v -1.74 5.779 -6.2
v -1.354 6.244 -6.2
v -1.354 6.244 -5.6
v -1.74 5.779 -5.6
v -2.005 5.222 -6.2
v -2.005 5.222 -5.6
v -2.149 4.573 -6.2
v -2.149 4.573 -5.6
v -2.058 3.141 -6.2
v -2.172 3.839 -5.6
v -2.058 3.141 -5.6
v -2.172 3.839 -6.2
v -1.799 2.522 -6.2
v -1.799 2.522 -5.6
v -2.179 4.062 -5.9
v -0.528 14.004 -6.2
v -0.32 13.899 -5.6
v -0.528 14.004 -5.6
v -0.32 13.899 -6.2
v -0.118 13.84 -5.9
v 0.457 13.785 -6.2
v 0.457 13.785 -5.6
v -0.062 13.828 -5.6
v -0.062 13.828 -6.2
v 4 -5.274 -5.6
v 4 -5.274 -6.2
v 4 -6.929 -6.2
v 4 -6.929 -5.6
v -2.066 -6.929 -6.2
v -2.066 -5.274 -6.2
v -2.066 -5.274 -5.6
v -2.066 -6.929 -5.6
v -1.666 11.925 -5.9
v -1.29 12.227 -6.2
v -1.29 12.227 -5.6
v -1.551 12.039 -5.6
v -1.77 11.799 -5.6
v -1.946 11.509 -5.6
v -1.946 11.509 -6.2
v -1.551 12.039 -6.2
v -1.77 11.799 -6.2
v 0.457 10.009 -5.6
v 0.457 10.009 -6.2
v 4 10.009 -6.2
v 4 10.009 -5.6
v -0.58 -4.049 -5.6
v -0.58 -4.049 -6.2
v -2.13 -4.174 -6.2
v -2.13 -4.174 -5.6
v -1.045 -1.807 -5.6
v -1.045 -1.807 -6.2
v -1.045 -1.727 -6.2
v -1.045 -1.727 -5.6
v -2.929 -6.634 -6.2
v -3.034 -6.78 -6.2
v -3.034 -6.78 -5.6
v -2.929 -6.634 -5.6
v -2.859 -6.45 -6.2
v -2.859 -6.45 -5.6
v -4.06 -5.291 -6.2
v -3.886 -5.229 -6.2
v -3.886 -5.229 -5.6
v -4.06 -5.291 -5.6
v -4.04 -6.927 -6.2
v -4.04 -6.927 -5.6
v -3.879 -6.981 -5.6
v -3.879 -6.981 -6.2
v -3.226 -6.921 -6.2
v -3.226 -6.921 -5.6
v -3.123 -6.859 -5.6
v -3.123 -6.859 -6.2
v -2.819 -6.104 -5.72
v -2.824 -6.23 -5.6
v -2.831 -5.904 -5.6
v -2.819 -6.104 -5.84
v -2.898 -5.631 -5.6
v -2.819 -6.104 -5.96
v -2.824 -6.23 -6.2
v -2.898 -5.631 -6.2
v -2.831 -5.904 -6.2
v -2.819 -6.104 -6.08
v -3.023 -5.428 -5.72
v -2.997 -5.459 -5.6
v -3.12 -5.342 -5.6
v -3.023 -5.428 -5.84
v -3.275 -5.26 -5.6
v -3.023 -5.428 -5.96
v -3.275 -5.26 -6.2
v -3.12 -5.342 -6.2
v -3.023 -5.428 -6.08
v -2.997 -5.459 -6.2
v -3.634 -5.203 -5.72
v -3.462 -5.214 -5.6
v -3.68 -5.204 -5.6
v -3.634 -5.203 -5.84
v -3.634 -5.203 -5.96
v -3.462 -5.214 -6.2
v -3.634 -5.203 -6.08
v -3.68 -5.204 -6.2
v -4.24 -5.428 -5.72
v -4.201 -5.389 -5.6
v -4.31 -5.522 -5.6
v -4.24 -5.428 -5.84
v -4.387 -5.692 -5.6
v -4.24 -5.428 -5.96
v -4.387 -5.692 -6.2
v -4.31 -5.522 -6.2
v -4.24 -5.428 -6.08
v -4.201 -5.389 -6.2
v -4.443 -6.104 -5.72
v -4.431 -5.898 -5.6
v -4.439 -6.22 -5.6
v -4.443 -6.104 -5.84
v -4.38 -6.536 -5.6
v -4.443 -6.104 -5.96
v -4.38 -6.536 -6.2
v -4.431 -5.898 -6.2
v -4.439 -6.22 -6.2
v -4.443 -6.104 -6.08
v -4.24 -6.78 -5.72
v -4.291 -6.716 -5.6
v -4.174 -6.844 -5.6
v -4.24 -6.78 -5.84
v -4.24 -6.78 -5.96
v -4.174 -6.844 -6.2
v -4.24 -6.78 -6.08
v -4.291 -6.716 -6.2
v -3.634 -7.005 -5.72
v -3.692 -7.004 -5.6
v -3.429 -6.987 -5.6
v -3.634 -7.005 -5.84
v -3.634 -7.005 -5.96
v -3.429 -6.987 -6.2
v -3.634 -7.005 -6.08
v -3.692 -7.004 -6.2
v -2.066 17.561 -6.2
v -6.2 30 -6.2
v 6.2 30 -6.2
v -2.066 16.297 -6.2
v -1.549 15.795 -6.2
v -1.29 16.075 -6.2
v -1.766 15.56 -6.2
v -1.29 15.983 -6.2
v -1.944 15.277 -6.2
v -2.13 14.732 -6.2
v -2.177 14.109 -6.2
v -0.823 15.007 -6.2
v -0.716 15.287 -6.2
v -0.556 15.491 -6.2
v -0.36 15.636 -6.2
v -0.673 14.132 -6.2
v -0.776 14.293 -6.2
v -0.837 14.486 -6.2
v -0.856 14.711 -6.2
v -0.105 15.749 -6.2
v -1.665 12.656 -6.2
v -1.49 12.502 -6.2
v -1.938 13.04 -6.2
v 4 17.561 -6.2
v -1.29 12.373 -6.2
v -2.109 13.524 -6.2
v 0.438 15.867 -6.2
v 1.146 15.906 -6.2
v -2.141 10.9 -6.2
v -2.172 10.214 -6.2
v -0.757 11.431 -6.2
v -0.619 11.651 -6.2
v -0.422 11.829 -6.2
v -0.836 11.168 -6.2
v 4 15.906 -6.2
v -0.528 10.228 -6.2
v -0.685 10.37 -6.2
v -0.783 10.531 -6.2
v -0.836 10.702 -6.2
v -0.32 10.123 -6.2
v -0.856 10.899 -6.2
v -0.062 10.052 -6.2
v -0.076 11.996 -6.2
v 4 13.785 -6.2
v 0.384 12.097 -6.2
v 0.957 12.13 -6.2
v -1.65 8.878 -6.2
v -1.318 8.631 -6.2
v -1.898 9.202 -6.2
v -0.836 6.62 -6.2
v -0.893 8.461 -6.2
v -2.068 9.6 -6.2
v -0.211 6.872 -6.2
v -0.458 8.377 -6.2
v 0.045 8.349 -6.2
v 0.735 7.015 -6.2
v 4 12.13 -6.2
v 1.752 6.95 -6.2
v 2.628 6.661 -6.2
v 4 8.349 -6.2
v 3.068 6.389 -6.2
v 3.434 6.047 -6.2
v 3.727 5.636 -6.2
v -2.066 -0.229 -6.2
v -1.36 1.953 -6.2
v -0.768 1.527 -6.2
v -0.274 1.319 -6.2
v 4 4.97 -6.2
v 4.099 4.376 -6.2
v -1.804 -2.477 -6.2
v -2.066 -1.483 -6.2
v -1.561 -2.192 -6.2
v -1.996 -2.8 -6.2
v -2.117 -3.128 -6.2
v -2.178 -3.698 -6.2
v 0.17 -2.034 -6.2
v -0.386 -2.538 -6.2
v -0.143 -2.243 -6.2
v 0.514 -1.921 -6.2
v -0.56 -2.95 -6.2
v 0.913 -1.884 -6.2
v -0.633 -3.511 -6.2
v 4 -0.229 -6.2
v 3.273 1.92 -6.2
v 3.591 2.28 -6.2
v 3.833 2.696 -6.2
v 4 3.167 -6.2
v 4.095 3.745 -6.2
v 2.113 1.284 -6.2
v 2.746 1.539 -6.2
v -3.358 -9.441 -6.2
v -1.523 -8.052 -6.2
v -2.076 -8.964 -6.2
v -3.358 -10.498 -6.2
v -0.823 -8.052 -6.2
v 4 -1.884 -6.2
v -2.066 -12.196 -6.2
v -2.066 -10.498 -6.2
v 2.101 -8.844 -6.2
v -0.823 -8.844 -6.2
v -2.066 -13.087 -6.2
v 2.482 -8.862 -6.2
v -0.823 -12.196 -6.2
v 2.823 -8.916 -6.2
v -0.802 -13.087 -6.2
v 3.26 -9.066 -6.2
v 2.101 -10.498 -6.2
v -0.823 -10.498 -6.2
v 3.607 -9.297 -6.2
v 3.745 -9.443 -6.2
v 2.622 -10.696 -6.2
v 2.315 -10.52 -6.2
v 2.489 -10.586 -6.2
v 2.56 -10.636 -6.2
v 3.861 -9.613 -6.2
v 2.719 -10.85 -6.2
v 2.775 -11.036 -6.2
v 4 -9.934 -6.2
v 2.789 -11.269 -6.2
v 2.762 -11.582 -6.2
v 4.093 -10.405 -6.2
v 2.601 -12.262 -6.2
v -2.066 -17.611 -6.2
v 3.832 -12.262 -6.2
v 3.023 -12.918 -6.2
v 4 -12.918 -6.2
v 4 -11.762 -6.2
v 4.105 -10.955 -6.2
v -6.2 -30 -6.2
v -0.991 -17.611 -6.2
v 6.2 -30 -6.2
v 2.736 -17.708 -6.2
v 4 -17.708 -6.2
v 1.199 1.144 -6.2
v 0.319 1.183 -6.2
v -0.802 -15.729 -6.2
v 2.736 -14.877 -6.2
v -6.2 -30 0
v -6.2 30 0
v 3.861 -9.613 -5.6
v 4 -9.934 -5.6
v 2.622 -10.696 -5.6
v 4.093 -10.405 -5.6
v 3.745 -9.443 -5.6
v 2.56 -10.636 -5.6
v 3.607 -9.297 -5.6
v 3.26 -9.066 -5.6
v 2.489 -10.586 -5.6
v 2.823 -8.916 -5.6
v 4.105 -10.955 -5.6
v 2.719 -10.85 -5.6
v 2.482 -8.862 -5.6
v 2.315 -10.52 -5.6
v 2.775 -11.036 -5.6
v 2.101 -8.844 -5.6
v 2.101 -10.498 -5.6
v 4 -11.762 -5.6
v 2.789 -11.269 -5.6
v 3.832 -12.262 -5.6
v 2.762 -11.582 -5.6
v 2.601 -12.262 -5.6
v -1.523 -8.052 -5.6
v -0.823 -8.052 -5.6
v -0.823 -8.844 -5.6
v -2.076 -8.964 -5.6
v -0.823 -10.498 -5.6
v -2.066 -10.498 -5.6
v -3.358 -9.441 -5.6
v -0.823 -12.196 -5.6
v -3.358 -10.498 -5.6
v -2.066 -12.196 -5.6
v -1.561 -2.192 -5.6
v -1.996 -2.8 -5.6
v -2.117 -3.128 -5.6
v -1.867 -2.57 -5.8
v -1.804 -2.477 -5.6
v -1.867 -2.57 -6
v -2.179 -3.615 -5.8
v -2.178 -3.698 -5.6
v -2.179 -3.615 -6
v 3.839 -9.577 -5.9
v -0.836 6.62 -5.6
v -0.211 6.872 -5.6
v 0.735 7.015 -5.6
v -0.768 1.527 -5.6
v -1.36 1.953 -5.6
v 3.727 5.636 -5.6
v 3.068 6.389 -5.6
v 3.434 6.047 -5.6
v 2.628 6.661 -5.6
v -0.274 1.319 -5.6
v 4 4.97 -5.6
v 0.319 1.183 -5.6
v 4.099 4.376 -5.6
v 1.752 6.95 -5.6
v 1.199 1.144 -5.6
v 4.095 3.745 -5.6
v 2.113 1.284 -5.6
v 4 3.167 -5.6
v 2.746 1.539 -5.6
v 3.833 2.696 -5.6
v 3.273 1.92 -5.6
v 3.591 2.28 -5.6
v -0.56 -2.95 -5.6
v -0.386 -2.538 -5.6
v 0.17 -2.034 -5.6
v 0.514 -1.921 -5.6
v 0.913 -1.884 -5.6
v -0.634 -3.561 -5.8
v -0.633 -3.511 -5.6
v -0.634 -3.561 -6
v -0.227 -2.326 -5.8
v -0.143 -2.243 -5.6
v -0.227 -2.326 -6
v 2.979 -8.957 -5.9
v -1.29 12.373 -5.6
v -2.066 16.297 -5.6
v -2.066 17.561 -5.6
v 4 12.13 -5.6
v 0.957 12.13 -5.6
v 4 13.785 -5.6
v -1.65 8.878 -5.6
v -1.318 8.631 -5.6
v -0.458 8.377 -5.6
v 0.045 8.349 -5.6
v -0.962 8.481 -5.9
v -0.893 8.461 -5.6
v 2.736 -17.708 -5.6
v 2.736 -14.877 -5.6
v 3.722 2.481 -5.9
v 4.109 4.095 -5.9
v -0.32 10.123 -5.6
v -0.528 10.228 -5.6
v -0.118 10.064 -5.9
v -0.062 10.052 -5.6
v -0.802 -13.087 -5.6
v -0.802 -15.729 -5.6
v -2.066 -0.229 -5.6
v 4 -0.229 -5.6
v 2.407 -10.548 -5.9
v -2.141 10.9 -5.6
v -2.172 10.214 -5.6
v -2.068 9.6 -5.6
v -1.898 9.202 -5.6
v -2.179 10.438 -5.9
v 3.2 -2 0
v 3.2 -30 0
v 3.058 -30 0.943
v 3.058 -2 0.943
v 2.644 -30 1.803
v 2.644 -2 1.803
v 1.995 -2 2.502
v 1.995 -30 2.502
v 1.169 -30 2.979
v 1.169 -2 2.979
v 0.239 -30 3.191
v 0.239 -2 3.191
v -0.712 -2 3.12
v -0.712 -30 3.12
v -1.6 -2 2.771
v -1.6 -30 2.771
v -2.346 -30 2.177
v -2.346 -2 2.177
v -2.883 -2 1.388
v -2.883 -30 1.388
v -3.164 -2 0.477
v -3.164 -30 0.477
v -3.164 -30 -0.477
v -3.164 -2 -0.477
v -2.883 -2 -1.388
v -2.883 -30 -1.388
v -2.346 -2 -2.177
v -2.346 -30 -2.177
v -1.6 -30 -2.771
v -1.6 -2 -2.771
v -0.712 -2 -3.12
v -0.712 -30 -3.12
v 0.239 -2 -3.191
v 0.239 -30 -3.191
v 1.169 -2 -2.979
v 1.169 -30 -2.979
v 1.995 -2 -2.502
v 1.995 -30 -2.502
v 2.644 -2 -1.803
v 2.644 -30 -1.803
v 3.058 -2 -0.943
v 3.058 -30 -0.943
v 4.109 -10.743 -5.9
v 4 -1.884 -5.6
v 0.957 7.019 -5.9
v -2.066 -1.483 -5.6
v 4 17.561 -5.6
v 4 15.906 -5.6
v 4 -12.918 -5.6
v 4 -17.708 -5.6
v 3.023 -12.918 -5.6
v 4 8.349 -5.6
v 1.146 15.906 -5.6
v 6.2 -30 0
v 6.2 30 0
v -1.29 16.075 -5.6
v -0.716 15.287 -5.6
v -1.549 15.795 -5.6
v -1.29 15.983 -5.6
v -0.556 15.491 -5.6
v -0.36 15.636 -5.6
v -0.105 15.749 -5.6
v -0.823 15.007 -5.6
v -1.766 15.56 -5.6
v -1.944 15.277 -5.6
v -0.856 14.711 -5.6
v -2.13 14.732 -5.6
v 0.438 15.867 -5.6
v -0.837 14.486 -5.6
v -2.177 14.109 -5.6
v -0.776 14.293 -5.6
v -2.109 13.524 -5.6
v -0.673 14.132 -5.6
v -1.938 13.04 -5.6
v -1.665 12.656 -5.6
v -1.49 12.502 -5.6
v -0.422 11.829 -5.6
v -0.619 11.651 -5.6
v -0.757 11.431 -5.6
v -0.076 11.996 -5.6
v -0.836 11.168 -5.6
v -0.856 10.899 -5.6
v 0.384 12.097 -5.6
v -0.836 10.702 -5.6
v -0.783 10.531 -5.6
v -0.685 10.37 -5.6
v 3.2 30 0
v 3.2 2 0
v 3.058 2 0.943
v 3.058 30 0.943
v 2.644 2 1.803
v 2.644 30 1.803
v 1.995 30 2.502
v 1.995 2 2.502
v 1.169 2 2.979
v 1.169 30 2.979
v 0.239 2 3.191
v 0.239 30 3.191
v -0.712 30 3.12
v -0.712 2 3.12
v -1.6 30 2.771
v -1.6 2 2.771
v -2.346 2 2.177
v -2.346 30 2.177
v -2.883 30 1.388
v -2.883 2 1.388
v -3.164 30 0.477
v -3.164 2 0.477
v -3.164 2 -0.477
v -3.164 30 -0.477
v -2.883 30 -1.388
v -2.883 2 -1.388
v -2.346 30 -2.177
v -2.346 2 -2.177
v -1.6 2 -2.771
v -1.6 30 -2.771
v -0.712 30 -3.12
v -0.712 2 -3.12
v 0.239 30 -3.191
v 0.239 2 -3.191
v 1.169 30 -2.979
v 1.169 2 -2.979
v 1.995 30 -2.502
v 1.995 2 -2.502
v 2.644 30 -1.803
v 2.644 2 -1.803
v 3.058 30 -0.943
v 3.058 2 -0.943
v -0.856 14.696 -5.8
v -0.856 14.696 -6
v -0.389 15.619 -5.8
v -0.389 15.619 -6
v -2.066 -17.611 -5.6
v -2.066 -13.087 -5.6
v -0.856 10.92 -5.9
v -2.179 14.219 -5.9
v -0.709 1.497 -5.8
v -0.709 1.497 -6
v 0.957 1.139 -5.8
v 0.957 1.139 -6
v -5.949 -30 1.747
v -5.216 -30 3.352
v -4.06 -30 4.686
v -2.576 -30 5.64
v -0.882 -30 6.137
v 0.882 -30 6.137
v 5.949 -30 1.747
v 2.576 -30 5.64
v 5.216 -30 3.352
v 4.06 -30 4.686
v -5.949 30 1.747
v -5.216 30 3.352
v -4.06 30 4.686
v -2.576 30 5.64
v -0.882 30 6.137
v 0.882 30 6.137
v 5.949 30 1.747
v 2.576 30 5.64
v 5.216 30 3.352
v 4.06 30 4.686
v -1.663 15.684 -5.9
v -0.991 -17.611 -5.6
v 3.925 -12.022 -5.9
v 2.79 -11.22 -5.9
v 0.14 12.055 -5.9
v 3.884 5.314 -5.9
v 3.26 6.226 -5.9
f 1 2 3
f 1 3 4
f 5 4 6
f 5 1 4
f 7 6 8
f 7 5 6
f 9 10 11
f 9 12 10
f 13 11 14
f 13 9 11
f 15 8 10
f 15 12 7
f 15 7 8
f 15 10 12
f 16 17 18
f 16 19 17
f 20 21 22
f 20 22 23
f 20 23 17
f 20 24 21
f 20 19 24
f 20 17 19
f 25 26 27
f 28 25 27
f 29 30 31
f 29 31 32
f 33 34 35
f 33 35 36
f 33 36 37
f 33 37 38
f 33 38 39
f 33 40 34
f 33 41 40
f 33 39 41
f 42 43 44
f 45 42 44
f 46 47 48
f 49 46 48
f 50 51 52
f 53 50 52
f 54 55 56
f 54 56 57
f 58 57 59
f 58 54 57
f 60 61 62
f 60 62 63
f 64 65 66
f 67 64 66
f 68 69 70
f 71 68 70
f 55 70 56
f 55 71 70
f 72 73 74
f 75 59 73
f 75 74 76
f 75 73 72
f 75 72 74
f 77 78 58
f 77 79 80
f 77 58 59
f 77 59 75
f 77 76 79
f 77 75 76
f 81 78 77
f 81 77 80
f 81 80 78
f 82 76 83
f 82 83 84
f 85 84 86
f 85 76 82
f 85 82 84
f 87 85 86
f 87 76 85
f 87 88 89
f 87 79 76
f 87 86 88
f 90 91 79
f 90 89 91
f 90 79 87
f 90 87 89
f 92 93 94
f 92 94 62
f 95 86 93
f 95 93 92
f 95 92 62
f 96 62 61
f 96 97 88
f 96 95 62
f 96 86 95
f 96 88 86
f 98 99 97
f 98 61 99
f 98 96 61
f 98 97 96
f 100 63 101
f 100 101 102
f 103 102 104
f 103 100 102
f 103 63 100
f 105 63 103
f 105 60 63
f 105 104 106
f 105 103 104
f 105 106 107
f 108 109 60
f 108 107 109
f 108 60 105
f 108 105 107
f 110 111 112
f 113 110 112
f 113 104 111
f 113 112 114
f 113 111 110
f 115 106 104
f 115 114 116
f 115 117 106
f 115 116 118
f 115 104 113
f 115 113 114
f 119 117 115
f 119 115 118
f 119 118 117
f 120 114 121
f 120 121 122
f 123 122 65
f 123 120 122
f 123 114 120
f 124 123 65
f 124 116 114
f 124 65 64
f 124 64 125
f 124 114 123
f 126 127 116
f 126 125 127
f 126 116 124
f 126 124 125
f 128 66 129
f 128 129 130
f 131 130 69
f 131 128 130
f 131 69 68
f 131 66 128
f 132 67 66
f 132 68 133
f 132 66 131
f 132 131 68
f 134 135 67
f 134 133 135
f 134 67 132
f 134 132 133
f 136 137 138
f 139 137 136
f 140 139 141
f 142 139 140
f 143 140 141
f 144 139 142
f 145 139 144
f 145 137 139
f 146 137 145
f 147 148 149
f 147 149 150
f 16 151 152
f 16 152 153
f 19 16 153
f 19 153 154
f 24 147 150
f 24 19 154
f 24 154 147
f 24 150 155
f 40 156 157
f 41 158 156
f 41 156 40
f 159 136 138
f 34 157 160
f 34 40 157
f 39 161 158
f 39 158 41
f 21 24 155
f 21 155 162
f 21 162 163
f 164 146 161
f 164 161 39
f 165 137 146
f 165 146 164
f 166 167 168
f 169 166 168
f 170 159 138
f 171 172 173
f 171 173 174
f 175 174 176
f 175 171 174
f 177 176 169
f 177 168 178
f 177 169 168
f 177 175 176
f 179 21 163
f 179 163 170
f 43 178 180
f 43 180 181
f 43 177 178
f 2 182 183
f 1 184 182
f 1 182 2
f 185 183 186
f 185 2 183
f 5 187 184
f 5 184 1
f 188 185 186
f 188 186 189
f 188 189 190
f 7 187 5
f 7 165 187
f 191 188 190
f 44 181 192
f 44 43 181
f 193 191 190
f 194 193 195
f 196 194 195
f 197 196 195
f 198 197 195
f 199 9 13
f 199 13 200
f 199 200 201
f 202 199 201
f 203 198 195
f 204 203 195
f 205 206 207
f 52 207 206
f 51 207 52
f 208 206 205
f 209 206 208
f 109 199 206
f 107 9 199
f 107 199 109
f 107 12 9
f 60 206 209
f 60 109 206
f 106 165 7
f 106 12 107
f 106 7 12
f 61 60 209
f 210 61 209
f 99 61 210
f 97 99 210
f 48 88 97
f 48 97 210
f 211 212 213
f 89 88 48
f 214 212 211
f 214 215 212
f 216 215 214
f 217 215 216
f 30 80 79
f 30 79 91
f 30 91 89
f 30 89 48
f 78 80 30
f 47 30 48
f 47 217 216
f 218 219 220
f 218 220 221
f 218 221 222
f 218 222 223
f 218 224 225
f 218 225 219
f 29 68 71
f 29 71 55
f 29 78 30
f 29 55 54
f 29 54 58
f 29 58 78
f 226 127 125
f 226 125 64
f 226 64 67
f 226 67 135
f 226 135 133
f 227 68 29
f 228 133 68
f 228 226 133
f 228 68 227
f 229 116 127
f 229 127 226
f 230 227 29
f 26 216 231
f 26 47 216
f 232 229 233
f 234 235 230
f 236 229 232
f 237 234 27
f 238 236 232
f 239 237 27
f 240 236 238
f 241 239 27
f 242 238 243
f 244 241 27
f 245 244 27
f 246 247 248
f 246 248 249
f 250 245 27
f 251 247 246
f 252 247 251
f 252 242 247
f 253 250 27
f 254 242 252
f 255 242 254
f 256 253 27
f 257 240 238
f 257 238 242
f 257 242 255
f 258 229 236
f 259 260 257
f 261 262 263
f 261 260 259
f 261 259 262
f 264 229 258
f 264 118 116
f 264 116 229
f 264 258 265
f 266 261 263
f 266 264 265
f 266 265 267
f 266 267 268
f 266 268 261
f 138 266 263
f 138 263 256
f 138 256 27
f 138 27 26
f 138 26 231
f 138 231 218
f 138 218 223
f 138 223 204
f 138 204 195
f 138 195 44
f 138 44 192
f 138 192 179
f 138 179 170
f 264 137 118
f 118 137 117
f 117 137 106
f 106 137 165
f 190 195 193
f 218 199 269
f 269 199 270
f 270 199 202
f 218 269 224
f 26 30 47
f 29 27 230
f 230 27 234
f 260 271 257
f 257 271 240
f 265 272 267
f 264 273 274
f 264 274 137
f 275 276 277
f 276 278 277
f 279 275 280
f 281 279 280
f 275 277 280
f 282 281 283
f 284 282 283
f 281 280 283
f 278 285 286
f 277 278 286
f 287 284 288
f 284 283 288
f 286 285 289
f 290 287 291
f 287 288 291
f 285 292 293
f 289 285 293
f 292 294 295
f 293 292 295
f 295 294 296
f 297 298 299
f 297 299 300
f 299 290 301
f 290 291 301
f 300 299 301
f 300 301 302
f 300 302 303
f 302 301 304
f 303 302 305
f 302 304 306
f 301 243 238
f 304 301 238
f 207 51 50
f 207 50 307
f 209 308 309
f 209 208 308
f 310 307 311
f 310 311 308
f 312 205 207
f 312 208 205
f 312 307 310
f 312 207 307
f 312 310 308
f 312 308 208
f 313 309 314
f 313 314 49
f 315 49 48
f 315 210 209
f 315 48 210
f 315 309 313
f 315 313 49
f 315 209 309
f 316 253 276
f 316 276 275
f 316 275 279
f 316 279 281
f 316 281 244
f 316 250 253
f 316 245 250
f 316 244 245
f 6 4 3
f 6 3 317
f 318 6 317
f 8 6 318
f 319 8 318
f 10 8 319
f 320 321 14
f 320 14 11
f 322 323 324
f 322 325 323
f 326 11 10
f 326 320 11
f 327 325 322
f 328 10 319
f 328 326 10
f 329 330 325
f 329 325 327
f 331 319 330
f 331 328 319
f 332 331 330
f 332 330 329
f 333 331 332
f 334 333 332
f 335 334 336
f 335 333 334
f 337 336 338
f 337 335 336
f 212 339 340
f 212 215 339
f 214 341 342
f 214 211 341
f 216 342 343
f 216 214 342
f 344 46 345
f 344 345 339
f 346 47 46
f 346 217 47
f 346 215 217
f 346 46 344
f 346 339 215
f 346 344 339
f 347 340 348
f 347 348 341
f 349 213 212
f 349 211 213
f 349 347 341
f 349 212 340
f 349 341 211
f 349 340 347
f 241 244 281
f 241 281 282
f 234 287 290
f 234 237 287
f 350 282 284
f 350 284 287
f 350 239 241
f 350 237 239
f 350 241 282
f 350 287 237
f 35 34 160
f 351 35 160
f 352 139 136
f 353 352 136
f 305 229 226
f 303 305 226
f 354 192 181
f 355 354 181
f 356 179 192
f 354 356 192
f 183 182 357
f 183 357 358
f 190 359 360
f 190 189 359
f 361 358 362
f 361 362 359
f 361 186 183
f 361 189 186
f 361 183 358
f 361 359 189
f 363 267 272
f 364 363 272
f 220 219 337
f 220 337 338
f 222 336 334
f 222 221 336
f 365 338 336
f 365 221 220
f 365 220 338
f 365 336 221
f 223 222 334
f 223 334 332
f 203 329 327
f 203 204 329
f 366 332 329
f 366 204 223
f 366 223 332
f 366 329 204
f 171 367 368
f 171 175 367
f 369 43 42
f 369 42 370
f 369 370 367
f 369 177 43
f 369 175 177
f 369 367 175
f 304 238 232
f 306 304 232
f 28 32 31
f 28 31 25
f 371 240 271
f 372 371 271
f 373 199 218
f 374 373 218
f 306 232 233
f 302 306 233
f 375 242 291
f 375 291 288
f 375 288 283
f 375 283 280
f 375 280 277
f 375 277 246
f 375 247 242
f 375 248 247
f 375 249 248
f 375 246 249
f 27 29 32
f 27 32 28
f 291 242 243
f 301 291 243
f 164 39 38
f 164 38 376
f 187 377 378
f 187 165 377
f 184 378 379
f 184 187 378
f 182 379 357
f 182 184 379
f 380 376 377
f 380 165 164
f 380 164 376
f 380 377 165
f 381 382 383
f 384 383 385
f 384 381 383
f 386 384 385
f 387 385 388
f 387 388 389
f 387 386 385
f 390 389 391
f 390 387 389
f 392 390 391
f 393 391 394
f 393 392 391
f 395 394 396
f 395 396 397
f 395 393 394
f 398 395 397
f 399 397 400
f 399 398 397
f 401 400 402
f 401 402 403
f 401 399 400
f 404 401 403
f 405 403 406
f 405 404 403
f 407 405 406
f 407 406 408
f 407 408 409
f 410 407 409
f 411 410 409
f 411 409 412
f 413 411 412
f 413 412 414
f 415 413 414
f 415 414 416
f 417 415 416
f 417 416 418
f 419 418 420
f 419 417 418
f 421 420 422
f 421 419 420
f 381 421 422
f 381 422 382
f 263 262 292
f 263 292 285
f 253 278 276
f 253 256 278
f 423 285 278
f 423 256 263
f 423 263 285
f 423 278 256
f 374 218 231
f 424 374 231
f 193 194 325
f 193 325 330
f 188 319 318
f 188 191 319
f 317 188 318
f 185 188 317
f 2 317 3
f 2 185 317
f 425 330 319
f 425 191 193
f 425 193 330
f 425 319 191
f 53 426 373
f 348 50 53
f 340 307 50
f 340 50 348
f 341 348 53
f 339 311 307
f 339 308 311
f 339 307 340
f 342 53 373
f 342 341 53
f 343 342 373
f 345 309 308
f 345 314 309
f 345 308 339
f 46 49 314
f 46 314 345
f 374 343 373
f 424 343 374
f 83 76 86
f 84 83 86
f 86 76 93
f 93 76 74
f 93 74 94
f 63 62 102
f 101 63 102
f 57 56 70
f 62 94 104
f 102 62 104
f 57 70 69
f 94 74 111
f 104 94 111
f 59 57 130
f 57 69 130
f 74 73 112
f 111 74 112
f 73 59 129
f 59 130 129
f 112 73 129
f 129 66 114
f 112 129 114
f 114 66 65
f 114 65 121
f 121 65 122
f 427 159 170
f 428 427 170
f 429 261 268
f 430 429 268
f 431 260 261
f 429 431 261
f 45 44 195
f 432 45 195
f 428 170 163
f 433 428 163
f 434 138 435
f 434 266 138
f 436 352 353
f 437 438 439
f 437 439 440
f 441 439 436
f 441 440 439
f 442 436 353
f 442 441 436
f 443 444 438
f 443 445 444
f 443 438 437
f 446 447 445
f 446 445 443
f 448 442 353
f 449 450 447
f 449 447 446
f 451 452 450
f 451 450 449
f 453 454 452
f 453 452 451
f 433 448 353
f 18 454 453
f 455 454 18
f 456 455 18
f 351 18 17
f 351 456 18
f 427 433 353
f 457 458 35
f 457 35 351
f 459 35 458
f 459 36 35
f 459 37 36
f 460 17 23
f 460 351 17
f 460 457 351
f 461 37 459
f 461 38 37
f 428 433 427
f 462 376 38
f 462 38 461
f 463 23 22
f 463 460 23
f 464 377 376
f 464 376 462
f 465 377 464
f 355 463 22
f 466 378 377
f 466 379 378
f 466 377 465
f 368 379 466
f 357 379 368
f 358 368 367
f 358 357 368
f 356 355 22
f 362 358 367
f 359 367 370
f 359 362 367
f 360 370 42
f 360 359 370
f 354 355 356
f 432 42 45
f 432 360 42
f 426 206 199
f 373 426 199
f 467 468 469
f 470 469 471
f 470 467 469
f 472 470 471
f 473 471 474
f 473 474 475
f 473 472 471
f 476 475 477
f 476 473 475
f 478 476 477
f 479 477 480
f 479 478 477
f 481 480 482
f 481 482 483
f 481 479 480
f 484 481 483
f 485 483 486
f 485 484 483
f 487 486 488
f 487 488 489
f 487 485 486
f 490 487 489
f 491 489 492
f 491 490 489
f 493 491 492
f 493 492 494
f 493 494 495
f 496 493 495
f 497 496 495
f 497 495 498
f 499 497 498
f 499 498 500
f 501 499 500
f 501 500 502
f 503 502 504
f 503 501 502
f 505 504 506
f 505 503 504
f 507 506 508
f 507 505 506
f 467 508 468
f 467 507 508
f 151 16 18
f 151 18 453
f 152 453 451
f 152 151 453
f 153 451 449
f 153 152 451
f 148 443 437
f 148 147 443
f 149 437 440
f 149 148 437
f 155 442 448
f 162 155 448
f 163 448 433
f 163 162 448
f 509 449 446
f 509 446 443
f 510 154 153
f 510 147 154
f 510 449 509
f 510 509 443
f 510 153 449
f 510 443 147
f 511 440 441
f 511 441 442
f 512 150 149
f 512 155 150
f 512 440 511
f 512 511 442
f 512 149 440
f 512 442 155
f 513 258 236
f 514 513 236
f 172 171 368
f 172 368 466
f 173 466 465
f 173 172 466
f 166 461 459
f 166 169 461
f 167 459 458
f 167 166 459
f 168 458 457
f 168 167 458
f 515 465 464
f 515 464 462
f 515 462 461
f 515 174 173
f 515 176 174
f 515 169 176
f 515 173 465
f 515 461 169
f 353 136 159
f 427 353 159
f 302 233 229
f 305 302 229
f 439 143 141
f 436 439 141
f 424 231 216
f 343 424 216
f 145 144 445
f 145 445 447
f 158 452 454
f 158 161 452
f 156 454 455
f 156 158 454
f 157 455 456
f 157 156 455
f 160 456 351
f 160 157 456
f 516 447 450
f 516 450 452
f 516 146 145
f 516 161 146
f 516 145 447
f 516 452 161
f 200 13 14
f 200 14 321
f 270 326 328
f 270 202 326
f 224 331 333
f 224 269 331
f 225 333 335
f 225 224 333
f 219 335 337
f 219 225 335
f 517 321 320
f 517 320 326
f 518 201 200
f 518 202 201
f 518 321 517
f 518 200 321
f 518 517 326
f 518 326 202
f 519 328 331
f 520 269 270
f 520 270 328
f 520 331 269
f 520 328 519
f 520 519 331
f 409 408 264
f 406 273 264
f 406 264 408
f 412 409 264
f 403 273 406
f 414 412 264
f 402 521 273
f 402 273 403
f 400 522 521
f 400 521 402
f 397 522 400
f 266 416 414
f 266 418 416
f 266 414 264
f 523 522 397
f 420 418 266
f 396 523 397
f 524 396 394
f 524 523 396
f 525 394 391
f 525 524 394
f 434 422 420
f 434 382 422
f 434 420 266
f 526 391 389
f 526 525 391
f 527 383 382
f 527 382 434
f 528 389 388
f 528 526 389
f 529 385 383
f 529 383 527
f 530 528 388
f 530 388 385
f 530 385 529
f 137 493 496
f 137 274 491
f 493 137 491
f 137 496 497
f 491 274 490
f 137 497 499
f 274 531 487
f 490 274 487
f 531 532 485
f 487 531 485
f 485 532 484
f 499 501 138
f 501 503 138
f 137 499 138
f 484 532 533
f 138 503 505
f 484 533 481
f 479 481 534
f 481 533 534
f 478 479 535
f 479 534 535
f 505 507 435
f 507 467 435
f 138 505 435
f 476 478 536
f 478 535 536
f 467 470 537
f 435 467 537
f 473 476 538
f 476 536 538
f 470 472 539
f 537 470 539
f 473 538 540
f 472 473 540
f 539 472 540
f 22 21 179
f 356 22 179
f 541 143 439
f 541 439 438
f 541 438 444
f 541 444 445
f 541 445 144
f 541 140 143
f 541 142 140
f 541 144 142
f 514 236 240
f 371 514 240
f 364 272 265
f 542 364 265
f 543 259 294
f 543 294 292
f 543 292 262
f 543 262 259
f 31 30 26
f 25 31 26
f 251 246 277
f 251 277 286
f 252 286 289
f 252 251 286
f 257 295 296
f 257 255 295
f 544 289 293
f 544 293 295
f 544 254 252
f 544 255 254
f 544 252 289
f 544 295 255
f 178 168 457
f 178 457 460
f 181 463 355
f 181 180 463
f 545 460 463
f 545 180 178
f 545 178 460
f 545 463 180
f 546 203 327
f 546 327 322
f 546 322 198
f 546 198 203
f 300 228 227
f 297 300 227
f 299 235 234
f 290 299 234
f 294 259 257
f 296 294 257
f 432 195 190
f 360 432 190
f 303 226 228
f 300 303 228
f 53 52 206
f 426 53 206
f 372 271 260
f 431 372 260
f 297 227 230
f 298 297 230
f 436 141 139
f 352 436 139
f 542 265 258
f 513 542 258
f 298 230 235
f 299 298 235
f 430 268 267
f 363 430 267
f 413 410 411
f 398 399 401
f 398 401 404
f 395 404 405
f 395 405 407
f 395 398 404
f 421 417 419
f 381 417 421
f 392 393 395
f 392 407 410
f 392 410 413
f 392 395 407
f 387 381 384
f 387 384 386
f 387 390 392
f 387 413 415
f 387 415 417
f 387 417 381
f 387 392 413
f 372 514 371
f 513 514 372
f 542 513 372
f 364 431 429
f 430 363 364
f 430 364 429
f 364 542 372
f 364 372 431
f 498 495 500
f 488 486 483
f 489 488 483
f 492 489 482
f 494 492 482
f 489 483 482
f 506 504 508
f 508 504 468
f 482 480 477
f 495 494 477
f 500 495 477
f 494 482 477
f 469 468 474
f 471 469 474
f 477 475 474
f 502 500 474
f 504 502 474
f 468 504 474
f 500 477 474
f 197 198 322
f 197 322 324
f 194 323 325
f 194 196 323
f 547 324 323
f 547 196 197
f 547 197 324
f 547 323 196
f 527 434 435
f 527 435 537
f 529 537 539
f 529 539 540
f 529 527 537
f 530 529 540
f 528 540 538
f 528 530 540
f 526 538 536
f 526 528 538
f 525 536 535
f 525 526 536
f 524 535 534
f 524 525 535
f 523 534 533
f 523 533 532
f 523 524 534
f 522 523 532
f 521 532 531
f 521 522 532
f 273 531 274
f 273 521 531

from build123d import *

# Parameters (mm, degrees)
F0_R     = 3.2
F1_DEPTH = 30
F2_W     = 6.0659722222
F2_H     = 1.6545138889
F3_DEPTH = 0.6
F4_R     = 3.2
F5_DEPTH = 2


with BuildPart() as f1:
    # F0 (on Front) → F1 (new body, symmetric)
    with BuildSketch(Plane.XZ):
        with BuildLine():
            ThreePointArc((0, -6.2), (4.3840620434, -4.3840620434), (6.2, 0))
            ThreePointArc((6.2, 0), (0, 6.2), (-6.2, 0))
            ThreePointArc((-6.2, 0), (-4.3840620434, -4.3840620434), (0, -6.2))
        make_face()
        Circle(F0_R, mode=Mode.SUBTRACT)
        with BuildLine():
            Line((6.2, -6.2), (6.2, 0))
            ThreePointArc((6.2, 0), (4.3840620434, -4.3840620434), (0, -6.2))
            Line((0, -6.2), (6.2, -6.2))
        make_face()
        with BuildLine():
            ThreePointArc((0, -6.2), (-4.3840620434, -4.3840620434), (-6.2, 0))
            Line((-6.2, 0), (-6.2, -6.2))
            Line((-6.2, -6.2), (0, -6.2))
        make_face()
    extrude(amount=F1_DEPTH, both=True)

    # F2 (on face) → F3 (cut)
    with BuildSketch(Plane(origin=(0, 0, -6.2), x_dir=(1, 0, 0), z_dir=(0, 0, -1))):
        with BuildLine():
            Line((-2.0659722222, 0.2291666667), (4, 0.2291666667))
            Line((4, 0.2291666667), (4, 1.8836805556))
            Line((4, 1.8836805556), (0.9131944444, 1.8836805556))
            add(Edge.make_bspline(
                [(-0.2265625, 2.3263888889), (0.1805555556, 1.8836805556), (0.9131944444, 1.8836805556)],
                knots=[0, 0, 0, 1, 1, 1], degree=2))
            add(Edge.make_bspline(
                [(-0.6336805556, 3.5607638889), (-0.6336805556, 2.7690972222), (-0.2265625, 2.3263888889)],
                knots=[0, 0, 0, 1, 1, 1], degree=2))
            add(Edge.make_bspline(
                [(-0.5798611111, 4.0486111111), (-0.6336805556, 3.8472222222), (-0.6336805556, 3.5607638889)],
                knots=[0, 0, 0, 1, 1, 1], degree=2))
            Line((-0.5798611111, 4.0486111111), (-2.1302083333, 4.1736111111))
            add(Edge.make_bspline(
                [(-2.1788194444, 3.6145833333), (-2.1788194444, 3.9513888889), (-2.1302083333, 4.1736111111)],
                knots=[0, 0, 0, 1, 1, 1], degree=2))
            add(Edge.make_bspline(
                [(-1.8671875, 2.5703125), (-2.1788194444, 3.0503472222), (-2.1788194444, 3.6145833333)],
                knots=[0, 0, 0, 1, 1, 1], degree=2))
            add(Edge.make_bspline(
                [(-1.0451388889, 1.8072916667), (-1.5555555556, 2.0902777778), (-1.8671875, 2.5703125)],
                knots=[0, 0, 0, 1, 1, 1], degree=2))
            Line((-1.0451388889, 1.8072916667), (-1.0451388889, 1.7274305556))
            Line((-1.0451388889, 1.7274305556), (-2.0659722222, 1.4826388889))
            Line((-2.0659722222, 1.4826388889), (-2.0659722222, 0.2291666667))
        make_face()
        with BuildLine():
            add(Edge.make_bspline(
                [(-3.6336805556, 5.203125), (-4.4427083333, 5.203125), (-4.4427083333, 6.1041666667)],
                knots=[0, 0, 0, 1, 1, 1], degree=2))
            add(Edge.make_bspline(
                [(-2.8194444444, 6.1041666667), (-2.8194444444, 5.203125), (-3.6336805556, 5.203125)],
                knots=[0, 0, 0, 1, 1, 1], degree=2))
            add(Edge.make_bspline(
                [(-3.0338541667, 6.7803819444), (-2.8194444444, 6.5555555556), (-2.8194444444, 6.1041666667)],
                knots=[0, 0, 0, 1, 1, 1], degree=2))
            add(Edge.make_bspline(
                [(-3.6336805556, 7.0052083333), (-3.2482638889, 7.0052083333), (-3.0338541667, 6.7803819444)],
                knots=[0, 0, 0, 1, 1, 1], degree=2))
            add(Edge.make_bspline(
                [(-4.4427083333, 6.1041666667), (-4.4427083333, 7.0052083333), (-3.6336805556, 7.0052083333)],
                knots=[0, 0, 0, 1, 1, 1], degree=2))
        make_face()
        with Locations((0.9670138889, 6.1015625)):
            Rectangle(F2_W, F2_H)
        Polygon((3.0225694444, 12.9184027778), (4, 12.9184027778), (4, 17.7083333333), (2.7361111111, 17.7083333333), (2.7361111111, 14.8767361111), (-0.9913194444, 17.6111111111), (-2.0659722222, 17.6111111111), (-2.0659722222, 13.0868055556), (-0.8020833333, 13.0868055556), (-0.8020833333, 15.7291666667), align=None)
        with BuildLine():
            Line((4, -3.1671269476), (4, -4.9702647151))
            add(Edge.make_bspline(
                [(4.109375, -4.0954861111), (4.109375, -4.562265294), (4, -4.9702647151)],
                knots=[0, 0, 0, 0.5345224838, 0.5345224838, 0.5345224838], degree=2))
            add(Edge.make_bspline(
                [(4, -3.1671269476), (4.109375, -3.5912137204), (4.109375, -4.0954861111)],
                knots=[0.6382803275, 0.6382803275, 0.6382803275, 1, 1, 1], degree=2))
        make_face()
        with BuildLine():
            add(Edge.make_bspline(
                [(4, 9.9340446327), (3.8749132105, 9.5386199411), (3.6067708333, 9.296875)],
                knots=[0.4664939231, 0.4664939231, 0.4664939231, 1, 1, 1], degree=2))
            Line((4, 9.9340446327), (4, 11.7624280914))
            add(Edge.make_bspline(
                [(3.8315972222, 12.2621527778), (3.9350708278, 12.0319240054), (4, 11.7624280914)],
                knots=[0, 0, 0, 0.3725049801, 0.3725049801, 0.3725049801], degree=2))
            Line((3.8315972222, 12.2621527778), (2.6006944444, 12.2621527778))
            add(Edge.make_bspline(
                [(2.7899305556, 11.2204861111), (2.7899305556, 11.6545138889), (2.6006944444, 12.2621527778)],
                knots=[0, 0, 0, 1, 1, 1], degree=2))
            add(Edge.make_bspline(
                [(2.6215277778, 10.6961805556), (2.7899305556, 10.8940972222), (2.7899305556, 11.2204861111)],
                knots=[0, 0, 0, 1, 1, 1], degree=2))
            add(Edge.make_bspline(
                [(2.1006944444, 10.4982638889), (2.453125, 10.4982638889), (2.6215277778, 10.6961805556)],
                knots=[0, 0, 0, 1, 1, 1], degree=2))
            Line((2.1006944444, 10.4982638889), (-0.8229166667, 10.4982638889))
            Line((-0.8229166667, 10.4982638889), (-0.8229166667, 12.1961805556))
            Line((-0.8229166667, 12.1961805556), (-2.0659722222, 12.1961805556))
            Line((-2.0659722222, 12.1961805556), (-2.0659722222, 10.4982638889))
            Line((-2.0659722222, 10.4982638889), (-3.3576388889, 10.4982638889))
            Line((-3.3576388889, 10.4982638889), (-3.3576388889, 9.4409722222))
            Line((-3.3576388889, 9.4409722222), (-2.0763888889, 8.9635416667))
            Line((-2.0763888889, 8.9635416667), (-1.5225694444, 8.0520833333))
            Line((-1.5225694444, 8.0520833333), (-0.8229166667, 8.0520833333))
            Line((-0.8229166667, 8.0520833333), (-0.8229166667, 8.84375))
            Line((-0.8229166667, 8.84375), (2.1006944444, 8.84375))
            add(Edge.make_bspline(
                [(3.6067708333, 9.296875), (3.1041666667, 8.84375), (2.1006944444, 8.84375)],
                knots=[0, 0, 0, 1, 1, 1], degree=2))
        make_face()
        with BuildLine():
            Line((4, 11.7624280914), (4, 9.9340446327))
            add(Edge.make_bspline(
                [(4.109375, 10.7430555556), (4.109375, 10.2798011736), (4, 9.9340446327)],
                knots=[0, 0, 0, 0.4664939231, 0.4664939231, 0.4664939231], degree=2))
            add(Edge.make_bspline(
                [(4, 11.7624280914), (4.109375, 11.3084547141), (4.109375, 10.7430555556)],
                knots=[0.3725049801, 0.3725049801, 0.3725049801, 1, 1, 1], degree=2))
        make_face()
        with BuildLine():
            Line((-2.0659722222, -17.5607638889), (4, -17.5607638889))
            Line((4, -17.5607638889), (4, -15.90625))
            Line((4, -15.90625), (1.1458333333, -15.90625))
            add(Edge.make_bspline(
                [(-0.3888888889, -15.6189236111), (0.078125, -15.90625), (1.1458333333, -15.90625)],
                knots=[0, 0, 0, 1, 1, 1], degree=2))
            add(Edge.make_bspline(
                [(-0.8559027778, -14.6961805556), (-0.8559027778, -15.3315972222), (-0.3888888889, -15.6189236111)],
                knots=[0, 0, 0, 1, 1, 1], degree=2))
            add(Edge.make_bspline(
                [(-0.5277777778, -14.0043402778), (-0.8559027778, -14.2239583333), (-0.8559027778, -14.6961805556)],
                knots=[0, 0, 0, 1, 1, 1], degree=2))
            add(Edge.make_bspline(
                [(0.4565972222, -13.7847222222), (-0.1996527778, -13.7847222222), (-0.5277777778, -14.0043402778)],
                knots=[0, 0, 0, 1, 1, 1], degree=2))
            Line((0.4565972222, -13.7847222222), (4, -13.7847222222))
            Line((4, -13.7847222222), (4, -12.1302083333))
            Line((4, -12.1302083333), (0.9565972222, -12.1302083333))
            add(Edge.make_bspline(
                [(-0.421875, -11.8289930556), (0.0121527778, -12.1302083333), (0.9565972222, -12.1302083333)],
                knots=[0, 0, 0, 1, 1, 1], degree=2))
            add(Edge.make_bspline(
                [(-0.8559027778, -10.9201388889), (-0.8559027778, -11.5277777778), (-0.421875, -11.8289930556)],
                knots=[0, 0, 0, 1, 1, 1], degree=2))
            add(Edge.make_bspline(
                [(-0.5277777778, -10.2282986111), (-0.8559027778, -10.4479166667), (-0.8559027778, -10.9201388889)],
                knots=[0, 0, 0, 1, 1, 1], degree=2))
            add(Edge.make_bspline(
                [(0.4565972222, -10.0086805556), (-0.1996527778, -10.0086805556), (-0.5277777778, -10.2282986111)],
                knots=[0, 0, 0, 1, 1, 1], degree=2))
            Line((0.4565972222, -10.0086805556), (4, -10.0086805556))
            Line((4, -10.0086805556), (4, -8.3489583333))
            Line((4, -8.3489583333), (0.0451388889, -8.3489583333))
            add(Edge.make_bspline(
                [(-1.6501736111, -8.8776041667), (-1.1215277778, -8.3489583333), (0.0451388889, -8.3489583333)],
                knots=[0, 0, 0, 1, 1, 1], degree=2))
            add(Edge.make_bspline(
                [(-2.1788194444, -10.4375), (-2.1788194444, -9.40625), (-1.6501736111, -8.8776041667)],
                knots=[0, 0, 0, 1, 1, 1], degree=2))
            add(Edge.make_bspline(
                [(-1.9461805556, -11.5086805556), (-2.1788194444, -11.0347222222), (-2.1788194444, -10.4375)],
                knots=[0, 0, 0, 1, 1, 1], degree=2))
            add(Edge.make_bspline(
                [(-1.2899305556, -12.2274305556), (-1.7135416667, -11.9826388889), (-1.9461805556, -11.5086805556)],
                knots=[0, 0, 0, 1, 1, 1], degree=2))
            Line((-1.2899305556, -12.2274305556), (-1.2899305556, -12.3732638889))
            add(Edge.make_bspline(
                [(-2.1788194444, -14.21875), (-2.1788194444, -12.8576388889), (-1.2899305556, -12.3732638889)],
                knots=[0, 0, 0, 1, 1, 1], degree=2))
            add(Edge.make_bspline(
                [(-1.9435763889, -15.2769097222), (-2.1788194444, -14.8159722222), (-2.1788194444, -14.21875)],
                knots=[0, 0, 0, 1, 1, 1], degree=2))
            add(Edge.make_bspline(
                [(-1.2899305556, -15.9826388889), (-1.7083333333, -15.7378472222), (-1.9435763889, -15.2769097222)],
                knots=[0, 0, 0, 1, 1, 1], degree=2))
            Line((-1.2899305556, -15.9826388889), (-1.2899305556, -16.0746527778))
            Line((-1.2899305556, -16.0746527778), (-2.0659722222, -16.296875))
            Line((-2.0659722222, -16.296875), (-2.0659722222, -17.5607638889))
        make_face()
        with BuildLine():
            add(Edge.make_bspline(
                [(4, -4.9702647151), (3.9047531117, -5.3255623178), (3.7265625, -5.6362847222)],
                knots=[0.5345224838, 0.5345224838, 0.5345224838, 1, 1, 1], degree=2))
            Line((4, -4.9702647151), (4, -3.1671269476))
            add(Edge.make_bspline(
                [(3.2734375, -1.9201388889), (3.8069999612, -2.4187953947), (4, -3.1671269476)],
                knots=[0, 0, 0, 0.6382803275, 0.6382803275, 0.6382803275], degree=2))
            add(Edge.make_bspline(
                [(0.9565972222, -1.1388888889), (2.4375, -1.1388888889), (3.2734375, -1.9201388889)],
                knots=[0, 0, 0, 1, 1, 1], degree=2))
            add(Edge.make_bspline(
                [(-0.7092013889, -1.4965277778), (0.0017361111, -1.1388888889), (0.9565972222, -1.1388888889)],
                knots=[0, 0, 0, 1, 1, 1], degree=2))
            add(Edge.make_bspline(
                [(-1.7994791667, -2.5217013889), (-1.4201388889, -1.8541666667), (-0.7092013889, -1.4965277778)],
                knots=[0, 0, 0, 1, 1, 1], degree=2))
            add(Edge.make_bspline(
                [(-2.1788194444, -4.0625), (-2.1788194444, -3.1892361111), (-1.7994791667, -2.5217013889)],
                knots=[0, 0, 0, 1, 1, 1], degree=2))
            add(Edge.make_bspline(
                [(-1.3541666667, -6.2439236111), (-2.1788194444, -5.46875), (-2.1788194444, -4.0625)],
                knots=[0, 0, 0, 1, 1, 1], degree=2))
            add(Edge.make_bspline(
                [(0.9565972222, -7.0190972222), (-0.5295138889, -7.0190972222), (-1.3541666667, -6.2439236111)],
                knots=[0, 0, 0, 1, 1, 1], degree=2))
            add(Edge.make_bspline(
                [(2.6276041667, -6.6614583333), (1.9114583333, -7.0190972222), (0.9565972222, -7.0190972222)],
                knots=[0, 0, 0, 1, 1, 1], degree=2))
            add(Edge.make_bspline(
                [(3.7265625, -5.6362847222), (3.34375, -6.3038194444), (2.6276041667, -6.6614583333)],
                knots=[0, 0, 0, 1, 1, 1], degree=2))
        make_face()
        with BuildLine():
            add(Edge.make_bspline(
                [(0.9565972222, -5.3333333333), (1.8576388889, -5.3333333333), (2.3185763889, -5.0373263889)],
                knots=[0, 0, 0, 1, 1, 1], degree=2))
            add(Edge.make_bspline(
                [(-0.3975694444, -5.0399305556), (0.0503472222, -5.3333333333), (0.9565972222, -5.3333333333)],
                knots=[0, 0, 0, 1, 1, 1], degree=2))
            add(Edge.make_bspline(
                [(-0.8454861111, -4.0850694444), (-0.8454861111, -4.7465277778), (-0.3975694444, -5.0399305556)],
                knots=[0, 0, 0, 1, 1, 1], degree=2))
            add(Edge.make_bspline(
                [(-0.3949652778, -3.1241319444), (-0.8454861111, -3.4166666667), (-0.8454861111, -4.0850694444)],
                knots=[0, 0, 0, 1, 1, 1], degree=2))
            add(Edge.make_bspline(
                [(0.9565972222, -2.8315972222), (0.0555555556, -2.8315972222), (-0.3949652778, -3.1241319444)],
                knots=[0, 0, 0, 1, 1, 1], degree=2))
            add(Edge.make_bspline(
                [(2.3211805556, -3.1215277778), (1.8628472222, -2.8315972222), (0.9565972222, -2.8315972222)],
                knots=[0, 0, 0, 1, 1, 1], degree=2))
            add(Edge.make_bspline(
                [(2.7795138889, -4.0746527778), (2.7795138889, -3.4114583333), (2.3211805556, -3.1215277778)],
                knots=[0, 0, 0, 1, 1, 1], degree=2))
            add(Edge.make_bspline(
                [(2.3185763889, -5.0373263889), (2.7795138889, -4.7413194444), (2.7795138889, -4.0746527778)],
                knots=[0, 0, 0, 1, 1, 1], degree=2))
        make_face(mode=Mode.SUBTRACT)
        with BuildLine():
            add(Edge.make_bspline(
                [(-0.3975694444, -5.0399305556), (0.0503472222, -5.3333333333), (0.9565972222, -5.3333333333)],
                knots=[0, 0, 0, 1, 1, 1], degree=2))
            add(Edge.make_bspline(
                [(0.9565972222, -5.3333333333), (1.8576388889, -5.3333333333), (2.3185763889, -5.0373263889)],
                knots=[0, 0, 0, 1, 1, 1], degree=2))
            add(Edge.make_bspline(
                [(2.3185763889, -5.0373263889), (2.7795138889, -4.7413194444), (2.7795138889, -4.0746527778)],
                knots=[0, 0, 0, 1, 1, 1], degree=2))
            add(Edge.make_bspline(
                [(2.7795138889, -4.0746527778), (2.7795138889, -3.4114583333), (2.3211805556, -3.1215277778)],
                knots=[0, 0, 0, 1, 1, 1], degree=2))
            add(Edge.make_bspline(
                [(2.3211805556, -3.1215277778), (1.8628472222, -2.8315972222), (0.9565972222, -2.8315972222)],
                knots=[0, 0, 0, 1, 1, 1], degree=2))
            add(Edge.make_bspline(
                [(0.9565972222, -2.8315972222), (0.0555555556, -2.8315972222), (-0.3949652778, -3.1241319444)],
                knots=[0, 0, 0, 1, 1, 1], degree=2))
            add(Edge.make_bspline(
                [(-0.3949652778, -3.1241319444), (-0.8454861111, -3.4166666667), (-0.8454861111, -4.0850694444)],
                knots=[0, 0, 0, 1, 1, 1], degree=2))
            add(Edge.make_bspline(
                [(-0.8454861111, -4.0850694444), (-0.8454861111, -4.7465277778), (-0.3975694444, -5.0399305556)],
                knots=[0, 0, 0, 1, 1, 1], degree=2))
        make_face()
    extrude(amount=-F3_DEPTH, mode=Mode.SUBTRACT)

    # F4 (on Front) → F5 (join, symmetric)
    with BuildSketch(Plane.XZ):
        Circle(F4_R)
    extrude(amount=F5_DEPTH, both=True)


solid = f1.part
